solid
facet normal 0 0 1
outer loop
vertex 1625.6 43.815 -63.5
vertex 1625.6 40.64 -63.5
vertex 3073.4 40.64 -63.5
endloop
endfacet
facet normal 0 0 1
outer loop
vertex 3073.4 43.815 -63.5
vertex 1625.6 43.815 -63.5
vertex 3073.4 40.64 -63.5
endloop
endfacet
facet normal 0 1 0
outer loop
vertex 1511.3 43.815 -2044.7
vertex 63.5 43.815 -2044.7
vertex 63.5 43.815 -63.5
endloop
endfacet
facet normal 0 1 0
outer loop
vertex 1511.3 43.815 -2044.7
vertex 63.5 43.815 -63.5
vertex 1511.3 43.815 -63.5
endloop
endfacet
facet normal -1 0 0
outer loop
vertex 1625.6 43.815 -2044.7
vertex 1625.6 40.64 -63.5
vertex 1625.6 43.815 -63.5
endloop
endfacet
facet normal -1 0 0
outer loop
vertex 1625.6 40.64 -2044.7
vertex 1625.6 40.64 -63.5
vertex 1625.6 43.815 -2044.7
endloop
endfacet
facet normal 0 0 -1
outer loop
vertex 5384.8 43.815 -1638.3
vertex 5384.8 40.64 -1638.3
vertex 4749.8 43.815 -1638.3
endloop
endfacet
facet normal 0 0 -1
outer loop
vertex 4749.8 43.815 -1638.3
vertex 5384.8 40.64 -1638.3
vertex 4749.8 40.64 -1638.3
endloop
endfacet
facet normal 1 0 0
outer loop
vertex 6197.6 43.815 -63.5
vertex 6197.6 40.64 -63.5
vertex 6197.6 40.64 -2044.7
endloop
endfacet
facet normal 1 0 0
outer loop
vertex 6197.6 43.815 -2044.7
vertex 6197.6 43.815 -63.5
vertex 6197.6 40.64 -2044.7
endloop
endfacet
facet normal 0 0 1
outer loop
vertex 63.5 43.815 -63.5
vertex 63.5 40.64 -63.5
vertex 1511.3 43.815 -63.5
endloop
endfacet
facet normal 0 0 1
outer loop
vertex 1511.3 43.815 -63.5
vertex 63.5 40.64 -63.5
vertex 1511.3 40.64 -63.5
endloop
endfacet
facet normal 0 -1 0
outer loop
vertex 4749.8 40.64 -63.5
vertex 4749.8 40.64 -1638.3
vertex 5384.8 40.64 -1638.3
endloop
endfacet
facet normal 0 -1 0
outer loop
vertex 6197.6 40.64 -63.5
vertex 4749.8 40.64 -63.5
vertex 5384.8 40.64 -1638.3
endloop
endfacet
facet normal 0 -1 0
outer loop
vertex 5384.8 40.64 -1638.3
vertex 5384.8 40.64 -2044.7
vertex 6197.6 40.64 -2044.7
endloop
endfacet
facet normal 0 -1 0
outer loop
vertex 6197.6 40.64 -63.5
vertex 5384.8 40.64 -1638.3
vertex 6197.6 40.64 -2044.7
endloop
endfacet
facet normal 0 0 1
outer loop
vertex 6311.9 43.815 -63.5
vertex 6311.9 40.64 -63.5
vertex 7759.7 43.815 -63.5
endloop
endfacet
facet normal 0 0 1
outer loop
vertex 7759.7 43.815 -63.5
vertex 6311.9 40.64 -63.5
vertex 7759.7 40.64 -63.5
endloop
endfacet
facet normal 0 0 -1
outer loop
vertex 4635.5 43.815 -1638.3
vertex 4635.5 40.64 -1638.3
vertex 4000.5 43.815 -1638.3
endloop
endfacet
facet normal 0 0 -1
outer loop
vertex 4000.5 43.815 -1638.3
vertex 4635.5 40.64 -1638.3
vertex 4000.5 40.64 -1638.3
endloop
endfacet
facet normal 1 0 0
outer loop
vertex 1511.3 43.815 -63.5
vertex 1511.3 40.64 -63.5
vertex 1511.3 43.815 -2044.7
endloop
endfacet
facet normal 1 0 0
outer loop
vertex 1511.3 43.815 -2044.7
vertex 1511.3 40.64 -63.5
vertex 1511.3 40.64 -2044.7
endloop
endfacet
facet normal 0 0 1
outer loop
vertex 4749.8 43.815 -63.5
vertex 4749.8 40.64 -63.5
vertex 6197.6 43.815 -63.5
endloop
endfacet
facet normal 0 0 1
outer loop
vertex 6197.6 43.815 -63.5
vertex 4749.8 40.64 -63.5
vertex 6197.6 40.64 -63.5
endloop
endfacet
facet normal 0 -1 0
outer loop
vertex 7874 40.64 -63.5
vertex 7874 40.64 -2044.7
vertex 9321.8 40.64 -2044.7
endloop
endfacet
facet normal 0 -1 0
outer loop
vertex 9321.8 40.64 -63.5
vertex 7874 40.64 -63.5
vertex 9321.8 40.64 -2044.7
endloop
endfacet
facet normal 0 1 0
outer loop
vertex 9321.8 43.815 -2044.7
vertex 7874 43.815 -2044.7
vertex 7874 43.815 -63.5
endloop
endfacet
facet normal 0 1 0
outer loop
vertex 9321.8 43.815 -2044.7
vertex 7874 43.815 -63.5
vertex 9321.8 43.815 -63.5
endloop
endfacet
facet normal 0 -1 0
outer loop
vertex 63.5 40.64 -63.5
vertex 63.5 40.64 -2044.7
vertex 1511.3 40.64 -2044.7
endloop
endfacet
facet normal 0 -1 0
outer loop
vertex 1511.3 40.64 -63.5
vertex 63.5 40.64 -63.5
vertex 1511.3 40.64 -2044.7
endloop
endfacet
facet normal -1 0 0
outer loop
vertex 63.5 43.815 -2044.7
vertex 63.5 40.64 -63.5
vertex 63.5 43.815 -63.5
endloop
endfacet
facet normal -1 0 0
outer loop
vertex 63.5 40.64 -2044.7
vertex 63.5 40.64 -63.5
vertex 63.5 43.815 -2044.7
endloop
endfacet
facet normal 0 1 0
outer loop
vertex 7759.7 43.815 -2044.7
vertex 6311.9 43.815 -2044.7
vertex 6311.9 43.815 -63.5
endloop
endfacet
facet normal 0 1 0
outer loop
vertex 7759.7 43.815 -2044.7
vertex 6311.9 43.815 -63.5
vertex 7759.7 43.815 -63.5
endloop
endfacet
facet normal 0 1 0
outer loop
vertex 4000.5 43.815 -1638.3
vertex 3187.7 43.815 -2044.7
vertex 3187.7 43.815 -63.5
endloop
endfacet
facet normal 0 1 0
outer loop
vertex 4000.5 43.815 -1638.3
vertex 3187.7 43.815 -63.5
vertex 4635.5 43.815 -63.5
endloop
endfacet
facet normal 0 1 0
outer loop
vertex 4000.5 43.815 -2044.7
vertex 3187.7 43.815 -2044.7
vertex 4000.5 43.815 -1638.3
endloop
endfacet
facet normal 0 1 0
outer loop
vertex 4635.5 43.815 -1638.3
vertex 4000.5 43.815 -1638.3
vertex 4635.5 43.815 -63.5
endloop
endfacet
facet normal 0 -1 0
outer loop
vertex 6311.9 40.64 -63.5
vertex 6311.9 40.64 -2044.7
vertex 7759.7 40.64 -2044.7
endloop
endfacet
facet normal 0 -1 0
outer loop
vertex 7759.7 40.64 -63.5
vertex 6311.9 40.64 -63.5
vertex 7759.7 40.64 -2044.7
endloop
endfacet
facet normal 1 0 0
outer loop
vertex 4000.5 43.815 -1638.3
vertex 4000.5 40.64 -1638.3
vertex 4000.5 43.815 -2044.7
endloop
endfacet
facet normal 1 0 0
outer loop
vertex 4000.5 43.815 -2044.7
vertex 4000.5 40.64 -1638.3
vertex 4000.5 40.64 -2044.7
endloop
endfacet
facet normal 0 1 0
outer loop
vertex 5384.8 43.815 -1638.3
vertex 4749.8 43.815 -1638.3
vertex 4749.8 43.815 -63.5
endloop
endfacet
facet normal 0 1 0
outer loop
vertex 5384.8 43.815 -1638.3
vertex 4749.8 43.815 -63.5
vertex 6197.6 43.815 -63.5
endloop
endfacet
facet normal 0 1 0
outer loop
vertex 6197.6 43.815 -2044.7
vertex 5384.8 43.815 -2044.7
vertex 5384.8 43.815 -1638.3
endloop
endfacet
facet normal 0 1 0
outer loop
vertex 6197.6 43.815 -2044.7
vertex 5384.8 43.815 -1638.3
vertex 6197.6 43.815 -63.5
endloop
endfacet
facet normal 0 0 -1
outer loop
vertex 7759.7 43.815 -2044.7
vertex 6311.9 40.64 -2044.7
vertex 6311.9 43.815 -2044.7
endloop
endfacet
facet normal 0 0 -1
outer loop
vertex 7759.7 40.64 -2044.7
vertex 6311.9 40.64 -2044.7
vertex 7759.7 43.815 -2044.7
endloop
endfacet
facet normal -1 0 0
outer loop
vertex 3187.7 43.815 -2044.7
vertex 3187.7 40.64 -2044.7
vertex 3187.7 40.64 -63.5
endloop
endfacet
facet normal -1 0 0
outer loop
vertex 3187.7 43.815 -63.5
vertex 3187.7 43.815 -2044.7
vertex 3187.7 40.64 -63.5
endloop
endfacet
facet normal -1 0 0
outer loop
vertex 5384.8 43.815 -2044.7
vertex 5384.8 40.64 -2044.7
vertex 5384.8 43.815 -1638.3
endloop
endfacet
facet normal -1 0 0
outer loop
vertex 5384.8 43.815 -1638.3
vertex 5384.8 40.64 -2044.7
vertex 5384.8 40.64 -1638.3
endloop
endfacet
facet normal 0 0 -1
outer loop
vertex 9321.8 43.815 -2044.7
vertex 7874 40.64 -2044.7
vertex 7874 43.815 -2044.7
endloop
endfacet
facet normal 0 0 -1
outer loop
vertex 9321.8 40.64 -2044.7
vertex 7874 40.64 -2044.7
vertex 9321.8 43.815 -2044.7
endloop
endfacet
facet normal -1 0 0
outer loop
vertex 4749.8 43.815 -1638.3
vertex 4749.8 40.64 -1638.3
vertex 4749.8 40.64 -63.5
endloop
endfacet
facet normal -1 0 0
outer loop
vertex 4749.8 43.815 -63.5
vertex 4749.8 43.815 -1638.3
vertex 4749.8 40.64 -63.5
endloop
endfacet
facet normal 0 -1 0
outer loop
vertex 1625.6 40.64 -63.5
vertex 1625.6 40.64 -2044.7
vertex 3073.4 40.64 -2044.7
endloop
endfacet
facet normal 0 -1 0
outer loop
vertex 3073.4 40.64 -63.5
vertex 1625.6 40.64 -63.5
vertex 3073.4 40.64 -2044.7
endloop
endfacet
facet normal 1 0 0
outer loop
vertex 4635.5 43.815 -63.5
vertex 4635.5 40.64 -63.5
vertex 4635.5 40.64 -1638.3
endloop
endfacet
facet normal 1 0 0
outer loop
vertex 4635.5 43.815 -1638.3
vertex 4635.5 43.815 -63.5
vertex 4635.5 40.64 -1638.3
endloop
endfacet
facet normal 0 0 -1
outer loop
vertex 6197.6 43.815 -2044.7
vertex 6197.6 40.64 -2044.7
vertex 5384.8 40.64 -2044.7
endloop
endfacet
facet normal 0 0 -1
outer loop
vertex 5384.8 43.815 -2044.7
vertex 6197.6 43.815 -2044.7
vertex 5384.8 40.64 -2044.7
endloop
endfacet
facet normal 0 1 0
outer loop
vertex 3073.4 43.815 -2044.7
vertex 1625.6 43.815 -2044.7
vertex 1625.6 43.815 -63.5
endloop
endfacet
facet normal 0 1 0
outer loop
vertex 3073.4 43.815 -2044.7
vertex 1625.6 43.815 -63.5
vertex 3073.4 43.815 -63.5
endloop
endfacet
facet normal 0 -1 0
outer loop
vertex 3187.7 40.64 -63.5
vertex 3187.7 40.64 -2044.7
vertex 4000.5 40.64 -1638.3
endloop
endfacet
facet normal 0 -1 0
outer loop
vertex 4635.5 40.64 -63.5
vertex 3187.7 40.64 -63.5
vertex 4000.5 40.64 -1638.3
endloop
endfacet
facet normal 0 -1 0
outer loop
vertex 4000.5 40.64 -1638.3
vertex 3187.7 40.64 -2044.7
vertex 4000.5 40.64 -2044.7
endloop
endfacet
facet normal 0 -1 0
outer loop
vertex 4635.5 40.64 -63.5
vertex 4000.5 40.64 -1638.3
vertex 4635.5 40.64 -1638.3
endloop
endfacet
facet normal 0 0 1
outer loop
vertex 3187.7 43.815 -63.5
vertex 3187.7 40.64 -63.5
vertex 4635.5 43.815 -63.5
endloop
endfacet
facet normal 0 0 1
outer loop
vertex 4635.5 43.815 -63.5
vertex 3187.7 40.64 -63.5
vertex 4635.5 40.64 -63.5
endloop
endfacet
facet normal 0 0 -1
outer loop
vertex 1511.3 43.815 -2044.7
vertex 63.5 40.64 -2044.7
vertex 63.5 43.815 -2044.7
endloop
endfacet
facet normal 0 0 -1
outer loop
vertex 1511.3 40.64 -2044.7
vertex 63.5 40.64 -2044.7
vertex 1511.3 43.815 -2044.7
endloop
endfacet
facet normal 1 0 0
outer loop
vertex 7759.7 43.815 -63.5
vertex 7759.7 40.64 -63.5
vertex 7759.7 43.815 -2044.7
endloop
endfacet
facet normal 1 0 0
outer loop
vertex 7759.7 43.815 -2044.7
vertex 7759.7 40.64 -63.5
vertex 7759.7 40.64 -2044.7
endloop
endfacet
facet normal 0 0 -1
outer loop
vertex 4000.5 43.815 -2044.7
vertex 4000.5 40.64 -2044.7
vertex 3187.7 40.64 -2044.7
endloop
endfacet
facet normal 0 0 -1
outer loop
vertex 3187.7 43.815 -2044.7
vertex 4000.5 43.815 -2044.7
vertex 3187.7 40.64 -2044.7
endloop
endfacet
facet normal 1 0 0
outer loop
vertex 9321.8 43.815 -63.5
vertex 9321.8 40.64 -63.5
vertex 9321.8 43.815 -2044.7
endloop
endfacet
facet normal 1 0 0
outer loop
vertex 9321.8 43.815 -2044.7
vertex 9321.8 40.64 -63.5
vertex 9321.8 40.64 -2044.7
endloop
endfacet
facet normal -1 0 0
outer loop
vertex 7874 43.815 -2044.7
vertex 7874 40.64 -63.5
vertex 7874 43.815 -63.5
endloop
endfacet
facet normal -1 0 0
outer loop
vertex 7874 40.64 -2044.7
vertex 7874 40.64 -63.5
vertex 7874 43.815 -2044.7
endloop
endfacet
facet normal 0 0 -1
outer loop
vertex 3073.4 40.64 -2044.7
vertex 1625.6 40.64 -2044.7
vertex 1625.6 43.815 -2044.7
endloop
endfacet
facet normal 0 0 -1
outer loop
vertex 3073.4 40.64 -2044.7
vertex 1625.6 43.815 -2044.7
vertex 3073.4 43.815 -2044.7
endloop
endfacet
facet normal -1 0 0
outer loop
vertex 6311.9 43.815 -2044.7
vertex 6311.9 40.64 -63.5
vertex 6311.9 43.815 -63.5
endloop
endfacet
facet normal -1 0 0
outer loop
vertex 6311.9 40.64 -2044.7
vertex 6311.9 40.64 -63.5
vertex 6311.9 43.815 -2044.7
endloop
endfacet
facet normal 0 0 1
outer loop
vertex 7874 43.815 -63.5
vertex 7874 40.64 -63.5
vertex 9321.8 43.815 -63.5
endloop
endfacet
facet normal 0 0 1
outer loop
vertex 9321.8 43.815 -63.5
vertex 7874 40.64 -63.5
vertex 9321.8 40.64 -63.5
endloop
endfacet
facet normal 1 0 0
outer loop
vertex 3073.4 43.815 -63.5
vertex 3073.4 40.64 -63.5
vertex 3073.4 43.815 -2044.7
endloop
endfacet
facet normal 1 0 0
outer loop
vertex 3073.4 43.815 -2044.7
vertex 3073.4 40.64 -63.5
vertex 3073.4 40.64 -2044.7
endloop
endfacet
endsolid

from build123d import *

# Parameters (mm, degrees)
SKETCH1_W             = 1447.8
SKETCH1_H             = 1981.2
BOSS_EXTRUDE3_DEPTH   = 3.175
BOSS_EXTRUDE3_2_DEPTH = 3.175
BOSS_EXTRUDE3_3_DEPTH = 3.175
BOSS_EXTRUDE3_4_DEPTH = 3.175
BOSS_EXTRUDE3_5_DEPTH = 3.175
BOSS_EXTRUDE3_6_DEPTH = 3.175


with BuildPart() as part:
    # Sketch1 → Boss-Extrude3 (new body)
    with BuildSketch(Plane(origin=(0, 40.64, 0), x_dir=(1, 0, 0), z_dir=(0, 1, 0))):
        with Locations((2349.5, 1054.1)):
            Rectangle(SKETCH1_W, SKETCH1_H)
    extrude(amount=BOSS_EXTRUDE3_DEPTH)


with BuildPart() as body_2:
    # Sketch1 → Boss-Extrude3 2 (new body)
    with BuildSketch(Plane(origin=(0, 40.64, 0), x_dir=(1, 0, 0), z_dir=(0, 1, 0))):
        with Locations((787.4, 1054.1)):
            Rectangle(SKETCH1_W, SKETCH1_H)
    extrude(amount=BOSS_EXTRUDE3_2_DEPTH)


with BuildPart() as body_3:
    # Sketch1 → Boss-Extrude3 3 (new body)
    with BuildSketch(Plane(origin=(0, 40.64, 0), x_dir=(1, 0, 0), z_dir=(0, 1, 0))):
        with Locations((8597.9, 1054.1)):
            Rectangle(SKETCH1_W, SKETCH1_H)
    extrude(amount=BOSS_EXTRUDE3_3_DEPTH)


with BuildPart() as body_4:
    # Sketch1 → Boss-Extrude3 4 (new body)
    with BuildSketch(Plane(origin=(0, 40.64, 0), x_dir=(1, 0, 0), z_dir=(0, 1, 0))):
        with Locations((7035.8, 1054.1)):
            Rectangle(SKETCH1_W, SKETCH1_H)
    extrude(amount=BOSS_EXTRUDE3_4_DEPTH)


with BuildPart() as body_5:
    # Sketch1 → Boss-Extrude3 5 (new body)
    with BuildSketch(Plane(origin=(0, 40.64, 0), x_dir=(1, 0, 0), z_dir=(0, 1, 0))):
        Polygon((6197.6, 2044.7), (5384.8, 2044.7), (5384.8, 1638.3), (4749.8, 1638.3), (4749.8, 63.5), (6197.6, 63.5), align=None)
    extrude(amount=BOSS_EXTRUDE3_5_DEPTH)


with BuildPart() as body_6:
    # Sketch1 → Boss-Extrude3 6 (new body)
    with BuildSketch(Plane(origin=(0, 40.64, 0), x_dir=(1, 0, 0), z_dir=(0, 1, 0))):
        Polygon((3187.7, 2044.7), (3187.7, 63.5), (4635.5, 63.5), (4635.5, 1638.3), (4000.5, 1638.3), (4000.5, 2044.7), align=None)
    extrude(amount=BOSS_EXTRUDE3_6_DEPTH)


solid = Compound([part.part, body_2.part, body_3.part, body_4.part, body_5.part, body_6.part])
